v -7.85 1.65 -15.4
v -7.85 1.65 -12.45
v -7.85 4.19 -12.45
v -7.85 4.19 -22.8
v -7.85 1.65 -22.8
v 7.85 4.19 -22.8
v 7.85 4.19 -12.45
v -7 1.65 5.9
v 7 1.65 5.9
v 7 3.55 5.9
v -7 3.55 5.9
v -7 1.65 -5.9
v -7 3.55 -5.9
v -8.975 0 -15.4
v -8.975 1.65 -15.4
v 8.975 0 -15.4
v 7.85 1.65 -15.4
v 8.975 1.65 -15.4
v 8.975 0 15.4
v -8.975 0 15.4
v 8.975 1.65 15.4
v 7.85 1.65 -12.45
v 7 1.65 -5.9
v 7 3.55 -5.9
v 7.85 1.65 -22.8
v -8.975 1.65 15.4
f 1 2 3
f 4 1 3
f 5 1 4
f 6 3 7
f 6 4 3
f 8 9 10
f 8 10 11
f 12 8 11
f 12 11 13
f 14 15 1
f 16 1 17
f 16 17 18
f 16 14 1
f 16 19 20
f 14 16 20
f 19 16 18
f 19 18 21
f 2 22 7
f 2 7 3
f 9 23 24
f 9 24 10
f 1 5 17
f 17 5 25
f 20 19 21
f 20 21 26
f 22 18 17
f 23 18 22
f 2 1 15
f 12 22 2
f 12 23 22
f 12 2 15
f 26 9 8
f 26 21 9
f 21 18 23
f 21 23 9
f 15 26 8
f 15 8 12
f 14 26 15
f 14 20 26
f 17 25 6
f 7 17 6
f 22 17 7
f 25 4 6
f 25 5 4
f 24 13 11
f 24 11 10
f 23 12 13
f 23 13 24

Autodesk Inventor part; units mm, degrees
ref_plane "YZ Plane" through (0, 0, 0) normal (1, 0, 0) x (0, 1, 0)
ref_plane "XZ Plane" through (0, 0, 0) normal (0, 1, 0) x (-1, 0, 0)
ref_plane "XY Plane" through (0, 0, 0) normal (0, 0, 1) x (1, 0, 0)
sketch "Skizze1" plane through (0, 0, 0) normal (0, 1, 0) x (-1, 0, 0)
  line L0 (-8.975, 15.4) -> (8.975, 15.4)
  line L1 (8.975, 15.4) -> (8.975, -15.4)
  line L2 (8.975, -15.4) -> (-8.975, -15.4)
  line L3 (-8.975, -15.4) -> (-8.975, 15.4)
  line L4 (-8.975, 15.4) -> (8.975, -15.4) construction
  line L5 (8.975, 15.4) -> (-8.975, -15.4) construction
  point P0 (0, 0)
  dimension "d0" = 17.95
  dimension "d1" = 30.8
extrude "Extrusion1" add sketch "Skizze1" along normal blind 1.65
sketch "Skizze2" plane through (0, 1.65, 0) normal (0, 1, 0) x (1, 0, 0)
  line L0 (-7, 5.9) -> (7, 5.9)
  line L1 (7, 5.9) -> (7, -5.9)
  line L2 (7, -5.9) -> (-7, -5.9)
  line L3 (-7, -5.9) -> (-7, 5.9)
  line L4 (-7, 5.9) -> (7, -5.9) construction
  line L5 (7, 5.9) -> (-7, -5.9) construction
  point P0 (0, 0)
  dimension "d4" = 14
  dimension "d5" = 11.8
extrude "Extrusion2" add sketch "Skizze2" along normal blind 1.9
sketch "Skizze3" plane through (0, 1.65, 0) normal (0, 1, 0) x (1, 0, 0)
  line L0 (7, 5.9) -> (7, -5.9) projected
  line L1 (7, -5.9) -> (-7, -5.9) projected
  line L2 (-7, -5.9) -> (-7, 5.9) projected
  line L3 (-7, 5.9) -> (7, 5.9) projected
  line L4 (-8.975, -15.4) -> (8.975, -15.4) projected
  line L5 (8.975, -15.4) -> (8.975, 15.4) projected
  line L6 (8.975, 15.4) -> (-8.975, 15.4) projected
  line L7 (-8.975, 15.4) -> (-8.975, -15.4) projected
  line L8 (7.85, 12.45) -> (-7.85, 12.45)
  line L9 (-7.85, 12.45) -> (-7.85, 22.8)
  line L10 (-7.85, 22.8) -> (7.85, 22.8)
  line L11 (7.85, 22.8) -> (7.85, 12.45)
  line L12 (0, -0.0027) -> (0, 15.4) construction
  point P0 (0, 0)
  dimension "d8" = 15.7
  dimension "d9" = 2.95
  dimension "d10" = 38.2
  dimension "d11" = 10.35
extrude "Extrusion3" add sketch "Skizze3" along normal blind 2.54 contours L9 L10 L11 L6 | L6 L11 L8 L9
properties part number "FTDI_Friend"
